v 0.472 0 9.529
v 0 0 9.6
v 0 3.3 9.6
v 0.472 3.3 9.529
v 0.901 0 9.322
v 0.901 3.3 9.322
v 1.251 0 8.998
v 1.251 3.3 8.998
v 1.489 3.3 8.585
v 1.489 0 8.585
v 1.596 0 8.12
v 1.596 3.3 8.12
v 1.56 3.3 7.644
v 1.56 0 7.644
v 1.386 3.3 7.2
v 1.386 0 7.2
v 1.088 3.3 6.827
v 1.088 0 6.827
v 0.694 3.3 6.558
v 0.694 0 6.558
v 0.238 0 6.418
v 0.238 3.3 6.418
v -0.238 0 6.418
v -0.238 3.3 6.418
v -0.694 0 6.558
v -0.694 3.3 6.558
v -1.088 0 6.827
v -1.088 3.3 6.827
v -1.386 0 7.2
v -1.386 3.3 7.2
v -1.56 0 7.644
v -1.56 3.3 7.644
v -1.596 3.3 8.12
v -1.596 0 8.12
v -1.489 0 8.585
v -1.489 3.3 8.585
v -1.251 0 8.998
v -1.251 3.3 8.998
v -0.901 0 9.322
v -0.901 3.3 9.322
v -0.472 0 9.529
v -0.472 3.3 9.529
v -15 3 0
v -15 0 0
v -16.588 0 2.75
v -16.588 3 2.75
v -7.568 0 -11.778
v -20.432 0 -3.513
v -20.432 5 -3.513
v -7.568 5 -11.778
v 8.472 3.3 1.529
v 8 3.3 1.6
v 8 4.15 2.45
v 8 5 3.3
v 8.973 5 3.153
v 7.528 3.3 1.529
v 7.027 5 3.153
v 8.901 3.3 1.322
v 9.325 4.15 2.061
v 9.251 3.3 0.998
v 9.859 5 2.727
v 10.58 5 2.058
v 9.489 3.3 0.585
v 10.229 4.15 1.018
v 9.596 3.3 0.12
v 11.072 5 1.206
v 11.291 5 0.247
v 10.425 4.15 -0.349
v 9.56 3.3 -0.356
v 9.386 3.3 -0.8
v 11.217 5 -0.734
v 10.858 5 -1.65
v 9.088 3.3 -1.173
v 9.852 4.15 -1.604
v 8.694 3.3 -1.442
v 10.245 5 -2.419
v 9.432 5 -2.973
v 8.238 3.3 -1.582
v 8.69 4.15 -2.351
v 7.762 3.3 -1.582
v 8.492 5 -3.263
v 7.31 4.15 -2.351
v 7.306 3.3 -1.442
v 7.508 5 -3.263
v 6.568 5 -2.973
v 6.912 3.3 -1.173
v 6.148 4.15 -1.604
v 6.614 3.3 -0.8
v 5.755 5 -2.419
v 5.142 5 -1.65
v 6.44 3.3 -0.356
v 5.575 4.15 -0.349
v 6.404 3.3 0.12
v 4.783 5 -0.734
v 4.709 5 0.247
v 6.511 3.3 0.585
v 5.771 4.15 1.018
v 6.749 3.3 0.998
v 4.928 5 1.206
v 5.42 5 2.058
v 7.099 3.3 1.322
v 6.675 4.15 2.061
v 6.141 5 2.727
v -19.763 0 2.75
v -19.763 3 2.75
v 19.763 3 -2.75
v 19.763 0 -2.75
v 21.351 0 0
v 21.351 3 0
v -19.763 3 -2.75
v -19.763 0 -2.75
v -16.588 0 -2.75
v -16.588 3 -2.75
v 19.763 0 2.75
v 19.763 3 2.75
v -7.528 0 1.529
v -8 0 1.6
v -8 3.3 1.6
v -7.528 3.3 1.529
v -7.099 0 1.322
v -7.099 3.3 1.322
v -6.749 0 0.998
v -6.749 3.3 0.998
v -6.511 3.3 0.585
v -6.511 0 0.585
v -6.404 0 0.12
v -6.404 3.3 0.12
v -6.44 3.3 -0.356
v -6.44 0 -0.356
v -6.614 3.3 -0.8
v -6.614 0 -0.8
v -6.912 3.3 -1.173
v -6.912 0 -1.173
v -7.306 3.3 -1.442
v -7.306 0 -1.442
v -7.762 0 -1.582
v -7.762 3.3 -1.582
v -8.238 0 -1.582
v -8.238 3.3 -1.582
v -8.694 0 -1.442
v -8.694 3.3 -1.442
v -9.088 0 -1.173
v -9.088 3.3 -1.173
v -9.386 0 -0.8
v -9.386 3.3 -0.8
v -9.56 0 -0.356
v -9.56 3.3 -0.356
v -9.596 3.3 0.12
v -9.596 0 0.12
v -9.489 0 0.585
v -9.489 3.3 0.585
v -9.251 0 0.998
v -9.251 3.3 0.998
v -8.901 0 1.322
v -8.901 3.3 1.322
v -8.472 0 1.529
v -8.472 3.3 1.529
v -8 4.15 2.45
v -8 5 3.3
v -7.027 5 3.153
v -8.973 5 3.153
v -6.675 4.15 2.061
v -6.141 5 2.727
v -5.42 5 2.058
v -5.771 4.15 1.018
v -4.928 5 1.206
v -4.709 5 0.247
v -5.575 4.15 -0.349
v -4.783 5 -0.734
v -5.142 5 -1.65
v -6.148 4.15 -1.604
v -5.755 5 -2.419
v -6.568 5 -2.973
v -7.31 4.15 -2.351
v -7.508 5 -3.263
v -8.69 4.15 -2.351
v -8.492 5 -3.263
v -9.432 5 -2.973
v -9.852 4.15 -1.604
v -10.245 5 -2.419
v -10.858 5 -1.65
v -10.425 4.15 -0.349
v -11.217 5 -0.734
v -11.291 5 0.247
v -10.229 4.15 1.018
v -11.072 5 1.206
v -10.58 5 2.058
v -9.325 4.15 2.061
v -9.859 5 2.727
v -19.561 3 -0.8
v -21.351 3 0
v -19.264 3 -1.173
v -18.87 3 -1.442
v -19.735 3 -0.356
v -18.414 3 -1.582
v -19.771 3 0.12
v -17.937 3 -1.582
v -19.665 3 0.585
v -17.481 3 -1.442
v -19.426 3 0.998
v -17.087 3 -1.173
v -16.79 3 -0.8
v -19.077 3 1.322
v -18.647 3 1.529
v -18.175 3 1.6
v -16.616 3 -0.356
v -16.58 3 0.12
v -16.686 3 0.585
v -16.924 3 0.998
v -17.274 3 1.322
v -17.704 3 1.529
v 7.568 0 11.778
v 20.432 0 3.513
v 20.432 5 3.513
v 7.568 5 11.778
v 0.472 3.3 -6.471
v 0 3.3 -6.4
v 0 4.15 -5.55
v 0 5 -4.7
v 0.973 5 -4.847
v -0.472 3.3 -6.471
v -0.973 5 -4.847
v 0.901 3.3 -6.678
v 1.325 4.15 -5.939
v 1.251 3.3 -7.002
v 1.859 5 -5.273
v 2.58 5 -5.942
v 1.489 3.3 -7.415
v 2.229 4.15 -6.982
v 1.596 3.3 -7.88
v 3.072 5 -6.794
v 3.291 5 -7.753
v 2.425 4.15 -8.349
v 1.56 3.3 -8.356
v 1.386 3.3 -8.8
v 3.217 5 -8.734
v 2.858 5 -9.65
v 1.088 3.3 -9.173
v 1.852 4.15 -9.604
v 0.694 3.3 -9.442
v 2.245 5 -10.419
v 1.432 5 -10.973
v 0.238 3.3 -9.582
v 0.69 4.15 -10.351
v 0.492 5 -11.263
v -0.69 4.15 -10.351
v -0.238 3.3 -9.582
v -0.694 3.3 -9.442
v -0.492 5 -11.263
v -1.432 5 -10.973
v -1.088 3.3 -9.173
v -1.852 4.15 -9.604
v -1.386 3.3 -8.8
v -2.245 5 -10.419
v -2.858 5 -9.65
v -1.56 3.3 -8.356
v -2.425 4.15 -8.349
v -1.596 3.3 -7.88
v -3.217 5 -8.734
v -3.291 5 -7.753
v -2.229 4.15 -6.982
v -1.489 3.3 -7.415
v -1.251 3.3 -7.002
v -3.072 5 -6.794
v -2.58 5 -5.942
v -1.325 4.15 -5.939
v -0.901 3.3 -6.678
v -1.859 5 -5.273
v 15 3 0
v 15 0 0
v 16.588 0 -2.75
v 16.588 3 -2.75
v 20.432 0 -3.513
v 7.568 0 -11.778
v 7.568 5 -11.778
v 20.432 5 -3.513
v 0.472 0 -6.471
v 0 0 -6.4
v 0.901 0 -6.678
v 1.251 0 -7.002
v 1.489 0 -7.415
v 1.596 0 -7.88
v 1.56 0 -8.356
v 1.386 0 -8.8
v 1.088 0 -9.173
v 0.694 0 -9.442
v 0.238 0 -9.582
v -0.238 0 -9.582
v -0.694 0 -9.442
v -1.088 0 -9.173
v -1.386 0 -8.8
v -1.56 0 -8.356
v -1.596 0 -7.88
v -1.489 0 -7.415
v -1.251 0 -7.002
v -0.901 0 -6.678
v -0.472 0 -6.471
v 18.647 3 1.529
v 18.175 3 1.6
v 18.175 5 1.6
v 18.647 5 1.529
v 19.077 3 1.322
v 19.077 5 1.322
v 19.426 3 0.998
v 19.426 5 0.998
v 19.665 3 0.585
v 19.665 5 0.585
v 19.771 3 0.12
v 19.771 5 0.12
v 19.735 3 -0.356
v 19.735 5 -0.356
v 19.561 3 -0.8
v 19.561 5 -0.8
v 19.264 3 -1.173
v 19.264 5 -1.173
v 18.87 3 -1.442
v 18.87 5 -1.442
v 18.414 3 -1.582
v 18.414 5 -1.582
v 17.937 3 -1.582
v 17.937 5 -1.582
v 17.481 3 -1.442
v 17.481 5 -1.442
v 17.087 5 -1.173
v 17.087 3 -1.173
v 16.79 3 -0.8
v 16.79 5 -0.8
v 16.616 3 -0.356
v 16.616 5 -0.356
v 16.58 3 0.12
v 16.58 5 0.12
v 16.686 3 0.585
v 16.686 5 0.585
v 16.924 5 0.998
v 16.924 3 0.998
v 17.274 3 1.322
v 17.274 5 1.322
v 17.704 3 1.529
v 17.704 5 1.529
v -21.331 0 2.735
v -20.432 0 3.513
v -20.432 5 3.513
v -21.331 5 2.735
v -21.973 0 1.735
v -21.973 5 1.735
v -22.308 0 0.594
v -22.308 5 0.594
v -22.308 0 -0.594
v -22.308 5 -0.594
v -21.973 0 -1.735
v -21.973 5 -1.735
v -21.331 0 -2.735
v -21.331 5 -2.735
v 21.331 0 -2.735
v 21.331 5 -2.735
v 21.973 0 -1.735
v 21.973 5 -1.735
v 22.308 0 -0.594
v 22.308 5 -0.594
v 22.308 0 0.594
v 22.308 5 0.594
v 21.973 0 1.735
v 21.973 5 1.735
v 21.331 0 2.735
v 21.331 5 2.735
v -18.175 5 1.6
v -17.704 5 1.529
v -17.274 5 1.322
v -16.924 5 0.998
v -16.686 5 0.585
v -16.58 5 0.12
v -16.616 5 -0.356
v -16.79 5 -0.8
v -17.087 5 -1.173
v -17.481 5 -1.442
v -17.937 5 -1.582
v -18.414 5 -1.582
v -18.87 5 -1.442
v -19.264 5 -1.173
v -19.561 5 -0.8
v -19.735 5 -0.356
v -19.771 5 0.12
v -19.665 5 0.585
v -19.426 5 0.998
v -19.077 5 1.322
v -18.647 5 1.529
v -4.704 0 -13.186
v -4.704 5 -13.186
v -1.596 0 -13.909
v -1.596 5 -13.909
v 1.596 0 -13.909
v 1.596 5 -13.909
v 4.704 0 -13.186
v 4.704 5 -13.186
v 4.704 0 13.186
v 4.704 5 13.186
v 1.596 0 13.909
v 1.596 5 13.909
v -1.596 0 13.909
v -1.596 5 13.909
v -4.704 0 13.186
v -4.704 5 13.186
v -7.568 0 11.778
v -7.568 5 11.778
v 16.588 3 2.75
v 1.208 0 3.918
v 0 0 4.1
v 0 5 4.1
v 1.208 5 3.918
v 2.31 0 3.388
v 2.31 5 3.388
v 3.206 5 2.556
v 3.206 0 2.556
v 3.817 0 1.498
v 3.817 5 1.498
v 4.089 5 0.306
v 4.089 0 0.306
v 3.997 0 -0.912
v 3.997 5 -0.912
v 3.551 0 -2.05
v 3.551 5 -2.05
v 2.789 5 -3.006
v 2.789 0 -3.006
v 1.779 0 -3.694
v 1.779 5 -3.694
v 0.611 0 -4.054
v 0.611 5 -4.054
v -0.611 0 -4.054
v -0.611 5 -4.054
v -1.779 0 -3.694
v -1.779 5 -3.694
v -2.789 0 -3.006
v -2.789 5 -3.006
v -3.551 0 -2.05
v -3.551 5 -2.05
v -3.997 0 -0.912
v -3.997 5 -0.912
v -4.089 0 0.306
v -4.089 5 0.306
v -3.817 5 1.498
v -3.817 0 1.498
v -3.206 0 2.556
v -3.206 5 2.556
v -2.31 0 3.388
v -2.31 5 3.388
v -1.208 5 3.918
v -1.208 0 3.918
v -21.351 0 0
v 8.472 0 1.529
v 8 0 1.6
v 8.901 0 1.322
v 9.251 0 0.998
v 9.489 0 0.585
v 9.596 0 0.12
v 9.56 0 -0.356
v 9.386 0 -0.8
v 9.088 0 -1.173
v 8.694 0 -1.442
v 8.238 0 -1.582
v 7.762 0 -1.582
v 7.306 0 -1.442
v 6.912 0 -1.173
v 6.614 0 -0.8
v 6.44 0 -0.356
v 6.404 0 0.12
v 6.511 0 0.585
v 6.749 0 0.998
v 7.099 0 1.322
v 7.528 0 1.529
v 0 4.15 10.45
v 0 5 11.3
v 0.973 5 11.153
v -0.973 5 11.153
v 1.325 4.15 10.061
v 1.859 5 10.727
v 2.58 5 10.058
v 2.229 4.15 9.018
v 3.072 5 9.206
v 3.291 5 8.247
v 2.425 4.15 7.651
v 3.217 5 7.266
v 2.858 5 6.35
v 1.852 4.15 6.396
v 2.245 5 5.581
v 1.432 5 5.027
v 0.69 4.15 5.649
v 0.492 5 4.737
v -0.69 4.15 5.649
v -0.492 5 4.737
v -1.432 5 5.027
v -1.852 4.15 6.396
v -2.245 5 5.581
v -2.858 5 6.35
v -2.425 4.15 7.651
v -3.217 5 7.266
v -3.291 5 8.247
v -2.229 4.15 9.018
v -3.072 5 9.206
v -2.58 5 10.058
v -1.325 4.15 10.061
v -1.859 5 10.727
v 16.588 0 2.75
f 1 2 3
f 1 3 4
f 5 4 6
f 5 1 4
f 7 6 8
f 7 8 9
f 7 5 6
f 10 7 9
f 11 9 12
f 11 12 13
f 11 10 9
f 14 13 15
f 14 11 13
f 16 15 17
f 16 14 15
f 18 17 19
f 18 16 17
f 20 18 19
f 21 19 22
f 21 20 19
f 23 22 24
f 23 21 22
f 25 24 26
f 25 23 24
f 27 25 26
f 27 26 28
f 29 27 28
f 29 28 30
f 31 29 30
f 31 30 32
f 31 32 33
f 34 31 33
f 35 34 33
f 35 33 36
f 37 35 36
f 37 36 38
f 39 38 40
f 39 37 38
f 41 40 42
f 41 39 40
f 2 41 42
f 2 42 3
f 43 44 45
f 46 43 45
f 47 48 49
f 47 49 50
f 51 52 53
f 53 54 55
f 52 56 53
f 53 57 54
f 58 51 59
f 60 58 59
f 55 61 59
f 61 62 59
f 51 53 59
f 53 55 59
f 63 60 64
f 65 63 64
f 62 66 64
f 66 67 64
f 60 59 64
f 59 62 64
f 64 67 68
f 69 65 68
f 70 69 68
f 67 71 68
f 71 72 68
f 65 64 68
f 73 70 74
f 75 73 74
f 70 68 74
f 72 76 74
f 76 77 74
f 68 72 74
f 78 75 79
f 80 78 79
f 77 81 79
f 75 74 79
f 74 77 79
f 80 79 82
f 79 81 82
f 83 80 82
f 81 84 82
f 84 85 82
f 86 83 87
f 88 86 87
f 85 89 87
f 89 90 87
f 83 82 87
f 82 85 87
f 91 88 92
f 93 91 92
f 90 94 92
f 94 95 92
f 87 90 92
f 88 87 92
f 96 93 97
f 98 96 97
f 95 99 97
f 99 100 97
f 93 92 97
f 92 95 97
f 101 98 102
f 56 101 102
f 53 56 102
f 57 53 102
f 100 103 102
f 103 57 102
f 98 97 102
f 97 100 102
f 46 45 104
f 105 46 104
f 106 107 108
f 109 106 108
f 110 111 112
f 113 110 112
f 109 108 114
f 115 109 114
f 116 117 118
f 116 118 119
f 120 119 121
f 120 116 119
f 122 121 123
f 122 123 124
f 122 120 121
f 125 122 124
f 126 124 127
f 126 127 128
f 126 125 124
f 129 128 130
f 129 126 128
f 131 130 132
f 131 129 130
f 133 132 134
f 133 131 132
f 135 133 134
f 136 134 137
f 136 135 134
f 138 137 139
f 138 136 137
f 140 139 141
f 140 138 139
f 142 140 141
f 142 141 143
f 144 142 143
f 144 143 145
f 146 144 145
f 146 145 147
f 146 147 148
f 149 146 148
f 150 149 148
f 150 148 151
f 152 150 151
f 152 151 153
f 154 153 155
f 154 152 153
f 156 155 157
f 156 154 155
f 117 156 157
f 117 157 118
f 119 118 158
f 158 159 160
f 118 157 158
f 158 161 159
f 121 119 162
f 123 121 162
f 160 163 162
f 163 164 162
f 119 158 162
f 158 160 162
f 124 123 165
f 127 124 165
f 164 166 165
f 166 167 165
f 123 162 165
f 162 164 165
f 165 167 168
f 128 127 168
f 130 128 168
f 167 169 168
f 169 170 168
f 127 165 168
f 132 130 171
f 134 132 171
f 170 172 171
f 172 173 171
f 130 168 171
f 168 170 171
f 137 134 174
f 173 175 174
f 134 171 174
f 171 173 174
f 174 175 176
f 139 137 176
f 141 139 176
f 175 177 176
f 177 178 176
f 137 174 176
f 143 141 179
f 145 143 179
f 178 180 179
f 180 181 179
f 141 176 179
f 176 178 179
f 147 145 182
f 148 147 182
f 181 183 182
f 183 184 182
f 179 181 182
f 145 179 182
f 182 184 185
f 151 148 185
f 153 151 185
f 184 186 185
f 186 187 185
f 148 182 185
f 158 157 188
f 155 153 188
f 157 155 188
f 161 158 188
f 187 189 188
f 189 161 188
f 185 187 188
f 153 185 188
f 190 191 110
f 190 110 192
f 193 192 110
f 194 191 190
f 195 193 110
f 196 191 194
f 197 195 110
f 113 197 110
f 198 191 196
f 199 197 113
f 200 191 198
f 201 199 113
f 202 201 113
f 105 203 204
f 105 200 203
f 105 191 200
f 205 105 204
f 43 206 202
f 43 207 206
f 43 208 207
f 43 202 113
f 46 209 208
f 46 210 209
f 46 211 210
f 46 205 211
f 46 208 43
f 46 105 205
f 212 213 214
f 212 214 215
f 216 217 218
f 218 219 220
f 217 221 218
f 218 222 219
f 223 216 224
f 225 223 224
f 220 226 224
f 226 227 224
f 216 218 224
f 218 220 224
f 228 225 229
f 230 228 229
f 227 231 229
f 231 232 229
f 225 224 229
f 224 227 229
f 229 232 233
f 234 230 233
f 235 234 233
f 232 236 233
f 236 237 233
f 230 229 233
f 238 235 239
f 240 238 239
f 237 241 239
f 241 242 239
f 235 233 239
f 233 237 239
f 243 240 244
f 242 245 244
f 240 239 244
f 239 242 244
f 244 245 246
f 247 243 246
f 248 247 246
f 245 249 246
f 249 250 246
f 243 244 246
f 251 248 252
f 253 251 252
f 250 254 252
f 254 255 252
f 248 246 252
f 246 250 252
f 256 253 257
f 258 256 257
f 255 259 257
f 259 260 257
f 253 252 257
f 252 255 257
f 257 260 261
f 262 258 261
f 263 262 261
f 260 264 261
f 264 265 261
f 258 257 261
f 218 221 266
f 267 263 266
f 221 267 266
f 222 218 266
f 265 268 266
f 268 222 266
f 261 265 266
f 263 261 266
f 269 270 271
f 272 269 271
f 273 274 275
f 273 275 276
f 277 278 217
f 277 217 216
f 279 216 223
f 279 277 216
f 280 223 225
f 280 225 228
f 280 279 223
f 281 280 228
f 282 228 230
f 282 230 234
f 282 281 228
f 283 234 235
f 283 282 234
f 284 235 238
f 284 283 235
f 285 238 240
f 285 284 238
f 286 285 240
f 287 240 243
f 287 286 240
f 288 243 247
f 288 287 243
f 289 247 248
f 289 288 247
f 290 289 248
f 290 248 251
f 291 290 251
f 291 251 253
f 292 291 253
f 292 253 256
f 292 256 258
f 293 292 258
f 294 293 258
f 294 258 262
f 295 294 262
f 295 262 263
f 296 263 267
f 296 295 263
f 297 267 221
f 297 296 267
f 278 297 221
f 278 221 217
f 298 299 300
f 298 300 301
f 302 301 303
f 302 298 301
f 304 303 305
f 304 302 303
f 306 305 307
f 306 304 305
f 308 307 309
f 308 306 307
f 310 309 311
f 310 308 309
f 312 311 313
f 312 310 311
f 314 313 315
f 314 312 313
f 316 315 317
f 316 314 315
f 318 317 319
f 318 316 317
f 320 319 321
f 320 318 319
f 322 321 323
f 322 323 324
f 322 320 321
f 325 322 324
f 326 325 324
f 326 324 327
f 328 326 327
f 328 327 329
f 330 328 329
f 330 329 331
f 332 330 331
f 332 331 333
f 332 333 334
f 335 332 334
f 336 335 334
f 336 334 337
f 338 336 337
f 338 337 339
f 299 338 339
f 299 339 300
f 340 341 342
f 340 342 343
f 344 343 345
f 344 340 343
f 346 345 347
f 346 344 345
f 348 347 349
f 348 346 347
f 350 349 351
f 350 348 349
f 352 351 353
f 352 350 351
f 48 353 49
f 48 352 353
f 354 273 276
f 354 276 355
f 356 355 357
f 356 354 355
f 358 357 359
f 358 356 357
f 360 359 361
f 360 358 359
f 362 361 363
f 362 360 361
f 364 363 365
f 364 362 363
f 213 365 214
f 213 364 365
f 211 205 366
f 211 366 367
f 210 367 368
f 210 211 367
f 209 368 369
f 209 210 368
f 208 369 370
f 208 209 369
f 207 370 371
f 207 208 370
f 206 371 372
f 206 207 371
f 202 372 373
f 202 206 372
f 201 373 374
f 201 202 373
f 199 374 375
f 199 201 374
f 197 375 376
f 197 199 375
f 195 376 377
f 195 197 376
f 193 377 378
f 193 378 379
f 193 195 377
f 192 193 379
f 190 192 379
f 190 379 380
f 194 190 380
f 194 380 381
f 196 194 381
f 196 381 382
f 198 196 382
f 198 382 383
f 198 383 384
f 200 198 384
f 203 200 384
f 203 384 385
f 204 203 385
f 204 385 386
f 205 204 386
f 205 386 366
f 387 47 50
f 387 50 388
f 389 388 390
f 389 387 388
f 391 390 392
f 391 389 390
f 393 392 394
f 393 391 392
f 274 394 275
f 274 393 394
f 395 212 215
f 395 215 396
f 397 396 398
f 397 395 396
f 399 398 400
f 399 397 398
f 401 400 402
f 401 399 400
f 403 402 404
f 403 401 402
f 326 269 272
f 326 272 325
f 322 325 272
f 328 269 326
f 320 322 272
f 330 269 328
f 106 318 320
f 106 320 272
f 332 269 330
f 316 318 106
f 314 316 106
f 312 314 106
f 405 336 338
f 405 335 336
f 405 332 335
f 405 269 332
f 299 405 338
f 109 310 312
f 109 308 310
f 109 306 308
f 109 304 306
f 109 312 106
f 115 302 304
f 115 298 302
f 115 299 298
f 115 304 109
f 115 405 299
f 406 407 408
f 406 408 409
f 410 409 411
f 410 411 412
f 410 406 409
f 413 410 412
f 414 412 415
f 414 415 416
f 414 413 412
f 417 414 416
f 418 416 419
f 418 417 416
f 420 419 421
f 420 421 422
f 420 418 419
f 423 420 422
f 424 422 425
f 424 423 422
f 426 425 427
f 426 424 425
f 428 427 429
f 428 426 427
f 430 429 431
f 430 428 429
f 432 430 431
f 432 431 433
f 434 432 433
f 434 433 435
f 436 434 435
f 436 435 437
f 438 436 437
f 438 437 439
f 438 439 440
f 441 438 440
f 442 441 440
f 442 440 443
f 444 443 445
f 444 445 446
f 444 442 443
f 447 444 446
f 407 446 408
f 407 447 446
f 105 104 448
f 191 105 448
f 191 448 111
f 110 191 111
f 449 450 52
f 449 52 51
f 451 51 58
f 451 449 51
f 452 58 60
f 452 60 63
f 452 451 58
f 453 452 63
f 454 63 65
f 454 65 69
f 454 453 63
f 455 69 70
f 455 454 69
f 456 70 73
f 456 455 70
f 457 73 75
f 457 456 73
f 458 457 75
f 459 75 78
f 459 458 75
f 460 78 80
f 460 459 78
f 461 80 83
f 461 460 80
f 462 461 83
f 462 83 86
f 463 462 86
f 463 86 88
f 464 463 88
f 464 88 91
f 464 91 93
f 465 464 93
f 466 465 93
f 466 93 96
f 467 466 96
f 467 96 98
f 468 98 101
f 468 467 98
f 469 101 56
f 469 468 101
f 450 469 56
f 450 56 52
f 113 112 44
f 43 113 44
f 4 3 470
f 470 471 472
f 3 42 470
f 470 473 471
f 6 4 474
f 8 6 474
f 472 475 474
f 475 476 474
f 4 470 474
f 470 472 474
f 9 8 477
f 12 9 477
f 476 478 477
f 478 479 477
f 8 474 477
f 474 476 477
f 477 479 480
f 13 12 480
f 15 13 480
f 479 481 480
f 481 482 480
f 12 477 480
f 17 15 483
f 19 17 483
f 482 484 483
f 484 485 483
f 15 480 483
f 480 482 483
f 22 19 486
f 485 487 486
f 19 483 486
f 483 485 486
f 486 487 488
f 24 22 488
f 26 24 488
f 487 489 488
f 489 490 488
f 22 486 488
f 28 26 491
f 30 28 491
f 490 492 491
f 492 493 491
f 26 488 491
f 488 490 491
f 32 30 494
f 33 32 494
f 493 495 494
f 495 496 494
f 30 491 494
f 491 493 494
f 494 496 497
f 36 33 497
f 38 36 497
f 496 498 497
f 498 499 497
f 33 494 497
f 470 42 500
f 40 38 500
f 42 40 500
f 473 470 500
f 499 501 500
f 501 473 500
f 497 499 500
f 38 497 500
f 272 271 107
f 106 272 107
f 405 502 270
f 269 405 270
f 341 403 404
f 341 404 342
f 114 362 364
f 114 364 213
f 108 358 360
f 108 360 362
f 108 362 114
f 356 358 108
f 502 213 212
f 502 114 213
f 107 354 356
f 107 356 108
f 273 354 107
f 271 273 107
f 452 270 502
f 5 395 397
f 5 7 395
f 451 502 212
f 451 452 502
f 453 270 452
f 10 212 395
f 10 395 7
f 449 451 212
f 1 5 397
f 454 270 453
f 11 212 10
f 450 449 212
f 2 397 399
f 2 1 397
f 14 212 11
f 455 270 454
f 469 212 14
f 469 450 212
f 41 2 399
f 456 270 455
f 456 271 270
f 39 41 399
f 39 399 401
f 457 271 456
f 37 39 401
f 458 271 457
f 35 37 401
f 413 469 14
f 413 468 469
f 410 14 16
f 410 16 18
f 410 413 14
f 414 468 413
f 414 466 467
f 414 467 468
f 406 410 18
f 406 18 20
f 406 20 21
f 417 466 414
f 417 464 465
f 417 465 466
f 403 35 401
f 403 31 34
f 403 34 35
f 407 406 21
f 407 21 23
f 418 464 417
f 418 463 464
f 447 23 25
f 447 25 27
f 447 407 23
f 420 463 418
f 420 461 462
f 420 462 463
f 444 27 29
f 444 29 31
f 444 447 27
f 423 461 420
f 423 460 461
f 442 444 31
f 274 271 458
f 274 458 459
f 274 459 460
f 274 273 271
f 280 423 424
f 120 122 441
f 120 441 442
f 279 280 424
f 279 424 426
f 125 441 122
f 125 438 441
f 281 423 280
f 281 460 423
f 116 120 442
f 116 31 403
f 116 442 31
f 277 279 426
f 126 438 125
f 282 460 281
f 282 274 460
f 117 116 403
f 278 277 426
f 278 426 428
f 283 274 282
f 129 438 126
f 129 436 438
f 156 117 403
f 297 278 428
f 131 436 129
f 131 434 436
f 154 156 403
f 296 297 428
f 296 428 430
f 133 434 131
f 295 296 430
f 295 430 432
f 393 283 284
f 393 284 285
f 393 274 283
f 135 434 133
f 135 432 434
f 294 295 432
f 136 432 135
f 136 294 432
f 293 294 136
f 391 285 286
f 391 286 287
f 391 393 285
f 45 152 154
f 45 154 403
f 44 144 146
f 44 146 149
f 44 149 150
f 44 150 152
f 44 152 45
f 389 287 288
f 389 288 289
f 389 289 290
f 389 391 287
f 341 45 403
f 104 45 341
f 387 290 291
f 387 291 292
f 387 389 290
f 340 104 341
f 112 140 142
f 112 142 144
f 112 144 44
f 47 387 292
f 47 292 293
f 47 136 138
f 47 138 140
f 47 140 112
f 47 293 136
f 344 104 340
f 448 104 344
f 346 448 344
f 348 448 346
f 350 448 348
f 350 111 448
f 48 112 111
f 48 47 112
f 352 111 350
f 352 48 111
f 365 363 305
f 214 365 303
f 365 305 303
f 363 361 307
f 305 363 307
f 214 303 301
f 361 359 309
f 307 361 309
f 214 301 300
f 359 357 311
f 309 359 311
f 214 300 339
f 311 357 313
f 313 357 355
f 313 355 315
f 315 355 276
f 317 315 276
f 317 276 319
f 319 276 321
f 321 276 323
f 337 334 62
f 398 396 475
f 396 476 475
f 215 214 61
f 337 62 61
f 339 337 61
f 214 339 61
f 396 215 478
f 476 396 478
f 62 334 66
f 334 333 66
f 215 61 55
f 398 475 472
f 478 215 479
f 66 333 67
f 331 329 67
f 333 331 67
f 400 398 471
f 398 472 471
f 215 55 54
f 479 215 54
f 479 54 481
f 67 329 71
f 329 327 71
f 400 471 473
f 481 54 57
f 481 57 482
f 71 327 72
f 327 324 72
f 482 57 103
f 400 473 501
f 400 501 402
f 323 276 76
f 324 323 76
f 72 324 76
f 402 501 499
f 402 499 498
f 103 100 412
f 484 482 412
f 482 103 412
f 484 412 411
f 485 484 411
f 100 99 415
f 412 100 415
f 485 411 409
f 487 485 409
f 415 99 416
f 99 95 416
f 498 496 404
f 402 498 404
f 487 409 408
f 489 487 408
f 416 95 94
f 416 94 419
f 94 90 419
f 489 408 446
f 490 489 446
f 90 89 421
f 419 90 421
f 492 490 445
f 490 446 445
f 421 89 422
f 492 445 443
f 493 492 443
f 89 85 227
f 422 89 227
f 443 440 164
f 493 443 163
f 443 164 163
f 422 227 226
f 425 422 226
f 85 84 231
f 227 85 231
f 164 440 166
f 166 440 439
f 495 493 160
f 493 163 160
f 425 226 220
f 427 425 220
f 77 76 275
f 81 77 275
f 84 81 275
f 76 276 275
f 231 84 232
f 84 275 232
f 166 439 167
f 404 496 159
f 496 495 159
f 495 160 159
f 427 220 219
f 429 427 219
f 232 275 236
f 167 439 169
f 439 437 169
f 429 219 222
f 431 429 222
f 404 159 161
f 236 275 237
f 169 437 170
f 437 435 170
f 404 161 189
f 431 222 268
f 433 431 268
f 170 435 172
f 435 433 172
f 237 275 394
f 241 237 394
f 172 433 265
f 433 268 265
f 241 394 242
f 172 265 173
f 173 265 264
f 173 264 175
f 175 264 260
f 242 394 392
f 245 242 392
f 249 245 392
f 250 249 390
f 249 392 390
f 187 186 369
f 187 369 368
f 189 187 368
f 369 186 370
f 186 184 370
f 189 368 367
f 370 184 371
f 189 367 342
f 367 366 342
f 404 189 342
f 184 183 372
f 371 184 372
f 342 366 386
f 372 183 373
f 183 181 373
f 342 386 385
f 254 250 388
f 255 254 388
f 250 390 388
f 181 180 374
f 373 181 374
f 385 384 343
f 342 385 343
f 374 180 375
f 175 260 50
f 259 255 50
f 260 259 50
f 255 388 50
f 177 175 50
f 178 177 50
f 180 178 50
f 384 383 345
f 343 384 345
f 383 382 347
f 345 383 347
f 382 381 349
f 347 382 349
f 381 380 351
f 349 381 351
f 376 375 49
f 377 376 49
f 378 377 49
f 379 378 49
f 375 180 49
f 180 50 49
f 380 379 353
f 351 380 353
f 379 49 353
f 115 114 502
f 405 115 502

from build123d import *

# Parameters (mm, degrees)
SKETCH1_R           = 4.1
SKETCH1_R_2         = 1.6
BOSS_EXTRUDE1_DEPTH = 5
CHAMFER1_SIZE       = 1.7
CUT_EXTRUDE1_DEPTH  = 3


with BuildPart() as part:
    # Sketch1 → Boss-Extrude1 (new body)
    with BuildSketch(Plane(origin=(0, 0, 0), x_dir=(1, 0, 0), z_dir=(0, 1, 0))):
        with BuildLine():
            Line((-20.432418055, 3.512858569), (-7.567581945, 11.778442321))
            ThreePointArc((-7.567581945, 11.778442321), (0, 14), (7.567581945, 11.778442321))
            Line((7.567581945, 11.778442321), (20.432418055, 3.512858569))
            ThreePointArc((20.432418055, 3.512858569), (22.350852961, 0), (20.432418055, -3.512858569))
            Line((20.432418055, -3.512858569), (7.567581945, -11.778442321))
            ThreePointArc((7.567581945, -11.778442321), (0, -14), (-7.567581945, -11.778442321))
            Line((-7.567581945, -11.778442321), (-20.432418055, -3.512858569))
            ThreePointArc((-20.432418055, -3.512858569), (-22.350852961, 0), (-20.432418055, 3.512858569))
        make_face()
        with Locations(Location((0, 0, 0), (0, 0, 270))):
            Circle(SKETCH1_R, mode=Mode.SUBTRACT)
        with Locations(Location((-18.175426481, 0, 0), (0, 0, 270))):
            Circle(SKETCH1_R_2, mode=Mode.SUBTRACT)
        with Locations(Location((18.175426481, 0, 0), (0, 0, 270))):
            Circle(SKETCH1_R_2, mode=Mode.SUBTRACT)
        with Locations(Location((0, 8, 0), (0, 0, 270))):
            Circle(SKETCH1_R_2, mode=Mode.SUBTRACT)
        with Locations(Location((8, 0, 0), (0, 0, 270))):
            Circle(SKETCH1_R_2, mode=Mode.SUBTRACT)
        with Locations(Location((0, -8, 0), (0, 0, 270))):
            Circle(SKETCH1_R_2, mode=Mode.SUBTRACT)
        with Locations(Location((-8, 0, 0), (0, 0, 270))):
            Circle(SKETCH1_R_2, mode=Mode.SUBTRACT)
    extrude(amount=BOSS_EXTRUDE1_DEPTH)

    # Chamfer1
    chamfer1_edges = [part.edges().sort_by_distance(p)[0] for p in [
        (0, 5, -9.6),
        (8, 5, -1.6),
        (0, 5, 6.4),
        (-8, 5, -1.6),
    ]]
    chamfer(chamfer1_edges, length=CHAMFER1_SIZE)

    # Sketch2 → Cut-Extrude1 (cut)
    with BuildSketch(Plane.XZ):
        Polygon((-15, 0), (-16.58771324, 2.75), (-19.763139721, 2.75), (-21.350852961, 0), (-19.763139721, -2.75), (-16.58771324, -2.75), align=None)
        Polygon((15, 0), (16.58771324, -2.75), (19.763139721, -2.75), (21.350852961, 0), (19.763139721, 2.75), (16.58771324, 2.75), align=None)
    extrude(amount=-CUT_EXTRUDE1_DEPTH, mode=Mode.SUBTRACT)


solid = part.part
